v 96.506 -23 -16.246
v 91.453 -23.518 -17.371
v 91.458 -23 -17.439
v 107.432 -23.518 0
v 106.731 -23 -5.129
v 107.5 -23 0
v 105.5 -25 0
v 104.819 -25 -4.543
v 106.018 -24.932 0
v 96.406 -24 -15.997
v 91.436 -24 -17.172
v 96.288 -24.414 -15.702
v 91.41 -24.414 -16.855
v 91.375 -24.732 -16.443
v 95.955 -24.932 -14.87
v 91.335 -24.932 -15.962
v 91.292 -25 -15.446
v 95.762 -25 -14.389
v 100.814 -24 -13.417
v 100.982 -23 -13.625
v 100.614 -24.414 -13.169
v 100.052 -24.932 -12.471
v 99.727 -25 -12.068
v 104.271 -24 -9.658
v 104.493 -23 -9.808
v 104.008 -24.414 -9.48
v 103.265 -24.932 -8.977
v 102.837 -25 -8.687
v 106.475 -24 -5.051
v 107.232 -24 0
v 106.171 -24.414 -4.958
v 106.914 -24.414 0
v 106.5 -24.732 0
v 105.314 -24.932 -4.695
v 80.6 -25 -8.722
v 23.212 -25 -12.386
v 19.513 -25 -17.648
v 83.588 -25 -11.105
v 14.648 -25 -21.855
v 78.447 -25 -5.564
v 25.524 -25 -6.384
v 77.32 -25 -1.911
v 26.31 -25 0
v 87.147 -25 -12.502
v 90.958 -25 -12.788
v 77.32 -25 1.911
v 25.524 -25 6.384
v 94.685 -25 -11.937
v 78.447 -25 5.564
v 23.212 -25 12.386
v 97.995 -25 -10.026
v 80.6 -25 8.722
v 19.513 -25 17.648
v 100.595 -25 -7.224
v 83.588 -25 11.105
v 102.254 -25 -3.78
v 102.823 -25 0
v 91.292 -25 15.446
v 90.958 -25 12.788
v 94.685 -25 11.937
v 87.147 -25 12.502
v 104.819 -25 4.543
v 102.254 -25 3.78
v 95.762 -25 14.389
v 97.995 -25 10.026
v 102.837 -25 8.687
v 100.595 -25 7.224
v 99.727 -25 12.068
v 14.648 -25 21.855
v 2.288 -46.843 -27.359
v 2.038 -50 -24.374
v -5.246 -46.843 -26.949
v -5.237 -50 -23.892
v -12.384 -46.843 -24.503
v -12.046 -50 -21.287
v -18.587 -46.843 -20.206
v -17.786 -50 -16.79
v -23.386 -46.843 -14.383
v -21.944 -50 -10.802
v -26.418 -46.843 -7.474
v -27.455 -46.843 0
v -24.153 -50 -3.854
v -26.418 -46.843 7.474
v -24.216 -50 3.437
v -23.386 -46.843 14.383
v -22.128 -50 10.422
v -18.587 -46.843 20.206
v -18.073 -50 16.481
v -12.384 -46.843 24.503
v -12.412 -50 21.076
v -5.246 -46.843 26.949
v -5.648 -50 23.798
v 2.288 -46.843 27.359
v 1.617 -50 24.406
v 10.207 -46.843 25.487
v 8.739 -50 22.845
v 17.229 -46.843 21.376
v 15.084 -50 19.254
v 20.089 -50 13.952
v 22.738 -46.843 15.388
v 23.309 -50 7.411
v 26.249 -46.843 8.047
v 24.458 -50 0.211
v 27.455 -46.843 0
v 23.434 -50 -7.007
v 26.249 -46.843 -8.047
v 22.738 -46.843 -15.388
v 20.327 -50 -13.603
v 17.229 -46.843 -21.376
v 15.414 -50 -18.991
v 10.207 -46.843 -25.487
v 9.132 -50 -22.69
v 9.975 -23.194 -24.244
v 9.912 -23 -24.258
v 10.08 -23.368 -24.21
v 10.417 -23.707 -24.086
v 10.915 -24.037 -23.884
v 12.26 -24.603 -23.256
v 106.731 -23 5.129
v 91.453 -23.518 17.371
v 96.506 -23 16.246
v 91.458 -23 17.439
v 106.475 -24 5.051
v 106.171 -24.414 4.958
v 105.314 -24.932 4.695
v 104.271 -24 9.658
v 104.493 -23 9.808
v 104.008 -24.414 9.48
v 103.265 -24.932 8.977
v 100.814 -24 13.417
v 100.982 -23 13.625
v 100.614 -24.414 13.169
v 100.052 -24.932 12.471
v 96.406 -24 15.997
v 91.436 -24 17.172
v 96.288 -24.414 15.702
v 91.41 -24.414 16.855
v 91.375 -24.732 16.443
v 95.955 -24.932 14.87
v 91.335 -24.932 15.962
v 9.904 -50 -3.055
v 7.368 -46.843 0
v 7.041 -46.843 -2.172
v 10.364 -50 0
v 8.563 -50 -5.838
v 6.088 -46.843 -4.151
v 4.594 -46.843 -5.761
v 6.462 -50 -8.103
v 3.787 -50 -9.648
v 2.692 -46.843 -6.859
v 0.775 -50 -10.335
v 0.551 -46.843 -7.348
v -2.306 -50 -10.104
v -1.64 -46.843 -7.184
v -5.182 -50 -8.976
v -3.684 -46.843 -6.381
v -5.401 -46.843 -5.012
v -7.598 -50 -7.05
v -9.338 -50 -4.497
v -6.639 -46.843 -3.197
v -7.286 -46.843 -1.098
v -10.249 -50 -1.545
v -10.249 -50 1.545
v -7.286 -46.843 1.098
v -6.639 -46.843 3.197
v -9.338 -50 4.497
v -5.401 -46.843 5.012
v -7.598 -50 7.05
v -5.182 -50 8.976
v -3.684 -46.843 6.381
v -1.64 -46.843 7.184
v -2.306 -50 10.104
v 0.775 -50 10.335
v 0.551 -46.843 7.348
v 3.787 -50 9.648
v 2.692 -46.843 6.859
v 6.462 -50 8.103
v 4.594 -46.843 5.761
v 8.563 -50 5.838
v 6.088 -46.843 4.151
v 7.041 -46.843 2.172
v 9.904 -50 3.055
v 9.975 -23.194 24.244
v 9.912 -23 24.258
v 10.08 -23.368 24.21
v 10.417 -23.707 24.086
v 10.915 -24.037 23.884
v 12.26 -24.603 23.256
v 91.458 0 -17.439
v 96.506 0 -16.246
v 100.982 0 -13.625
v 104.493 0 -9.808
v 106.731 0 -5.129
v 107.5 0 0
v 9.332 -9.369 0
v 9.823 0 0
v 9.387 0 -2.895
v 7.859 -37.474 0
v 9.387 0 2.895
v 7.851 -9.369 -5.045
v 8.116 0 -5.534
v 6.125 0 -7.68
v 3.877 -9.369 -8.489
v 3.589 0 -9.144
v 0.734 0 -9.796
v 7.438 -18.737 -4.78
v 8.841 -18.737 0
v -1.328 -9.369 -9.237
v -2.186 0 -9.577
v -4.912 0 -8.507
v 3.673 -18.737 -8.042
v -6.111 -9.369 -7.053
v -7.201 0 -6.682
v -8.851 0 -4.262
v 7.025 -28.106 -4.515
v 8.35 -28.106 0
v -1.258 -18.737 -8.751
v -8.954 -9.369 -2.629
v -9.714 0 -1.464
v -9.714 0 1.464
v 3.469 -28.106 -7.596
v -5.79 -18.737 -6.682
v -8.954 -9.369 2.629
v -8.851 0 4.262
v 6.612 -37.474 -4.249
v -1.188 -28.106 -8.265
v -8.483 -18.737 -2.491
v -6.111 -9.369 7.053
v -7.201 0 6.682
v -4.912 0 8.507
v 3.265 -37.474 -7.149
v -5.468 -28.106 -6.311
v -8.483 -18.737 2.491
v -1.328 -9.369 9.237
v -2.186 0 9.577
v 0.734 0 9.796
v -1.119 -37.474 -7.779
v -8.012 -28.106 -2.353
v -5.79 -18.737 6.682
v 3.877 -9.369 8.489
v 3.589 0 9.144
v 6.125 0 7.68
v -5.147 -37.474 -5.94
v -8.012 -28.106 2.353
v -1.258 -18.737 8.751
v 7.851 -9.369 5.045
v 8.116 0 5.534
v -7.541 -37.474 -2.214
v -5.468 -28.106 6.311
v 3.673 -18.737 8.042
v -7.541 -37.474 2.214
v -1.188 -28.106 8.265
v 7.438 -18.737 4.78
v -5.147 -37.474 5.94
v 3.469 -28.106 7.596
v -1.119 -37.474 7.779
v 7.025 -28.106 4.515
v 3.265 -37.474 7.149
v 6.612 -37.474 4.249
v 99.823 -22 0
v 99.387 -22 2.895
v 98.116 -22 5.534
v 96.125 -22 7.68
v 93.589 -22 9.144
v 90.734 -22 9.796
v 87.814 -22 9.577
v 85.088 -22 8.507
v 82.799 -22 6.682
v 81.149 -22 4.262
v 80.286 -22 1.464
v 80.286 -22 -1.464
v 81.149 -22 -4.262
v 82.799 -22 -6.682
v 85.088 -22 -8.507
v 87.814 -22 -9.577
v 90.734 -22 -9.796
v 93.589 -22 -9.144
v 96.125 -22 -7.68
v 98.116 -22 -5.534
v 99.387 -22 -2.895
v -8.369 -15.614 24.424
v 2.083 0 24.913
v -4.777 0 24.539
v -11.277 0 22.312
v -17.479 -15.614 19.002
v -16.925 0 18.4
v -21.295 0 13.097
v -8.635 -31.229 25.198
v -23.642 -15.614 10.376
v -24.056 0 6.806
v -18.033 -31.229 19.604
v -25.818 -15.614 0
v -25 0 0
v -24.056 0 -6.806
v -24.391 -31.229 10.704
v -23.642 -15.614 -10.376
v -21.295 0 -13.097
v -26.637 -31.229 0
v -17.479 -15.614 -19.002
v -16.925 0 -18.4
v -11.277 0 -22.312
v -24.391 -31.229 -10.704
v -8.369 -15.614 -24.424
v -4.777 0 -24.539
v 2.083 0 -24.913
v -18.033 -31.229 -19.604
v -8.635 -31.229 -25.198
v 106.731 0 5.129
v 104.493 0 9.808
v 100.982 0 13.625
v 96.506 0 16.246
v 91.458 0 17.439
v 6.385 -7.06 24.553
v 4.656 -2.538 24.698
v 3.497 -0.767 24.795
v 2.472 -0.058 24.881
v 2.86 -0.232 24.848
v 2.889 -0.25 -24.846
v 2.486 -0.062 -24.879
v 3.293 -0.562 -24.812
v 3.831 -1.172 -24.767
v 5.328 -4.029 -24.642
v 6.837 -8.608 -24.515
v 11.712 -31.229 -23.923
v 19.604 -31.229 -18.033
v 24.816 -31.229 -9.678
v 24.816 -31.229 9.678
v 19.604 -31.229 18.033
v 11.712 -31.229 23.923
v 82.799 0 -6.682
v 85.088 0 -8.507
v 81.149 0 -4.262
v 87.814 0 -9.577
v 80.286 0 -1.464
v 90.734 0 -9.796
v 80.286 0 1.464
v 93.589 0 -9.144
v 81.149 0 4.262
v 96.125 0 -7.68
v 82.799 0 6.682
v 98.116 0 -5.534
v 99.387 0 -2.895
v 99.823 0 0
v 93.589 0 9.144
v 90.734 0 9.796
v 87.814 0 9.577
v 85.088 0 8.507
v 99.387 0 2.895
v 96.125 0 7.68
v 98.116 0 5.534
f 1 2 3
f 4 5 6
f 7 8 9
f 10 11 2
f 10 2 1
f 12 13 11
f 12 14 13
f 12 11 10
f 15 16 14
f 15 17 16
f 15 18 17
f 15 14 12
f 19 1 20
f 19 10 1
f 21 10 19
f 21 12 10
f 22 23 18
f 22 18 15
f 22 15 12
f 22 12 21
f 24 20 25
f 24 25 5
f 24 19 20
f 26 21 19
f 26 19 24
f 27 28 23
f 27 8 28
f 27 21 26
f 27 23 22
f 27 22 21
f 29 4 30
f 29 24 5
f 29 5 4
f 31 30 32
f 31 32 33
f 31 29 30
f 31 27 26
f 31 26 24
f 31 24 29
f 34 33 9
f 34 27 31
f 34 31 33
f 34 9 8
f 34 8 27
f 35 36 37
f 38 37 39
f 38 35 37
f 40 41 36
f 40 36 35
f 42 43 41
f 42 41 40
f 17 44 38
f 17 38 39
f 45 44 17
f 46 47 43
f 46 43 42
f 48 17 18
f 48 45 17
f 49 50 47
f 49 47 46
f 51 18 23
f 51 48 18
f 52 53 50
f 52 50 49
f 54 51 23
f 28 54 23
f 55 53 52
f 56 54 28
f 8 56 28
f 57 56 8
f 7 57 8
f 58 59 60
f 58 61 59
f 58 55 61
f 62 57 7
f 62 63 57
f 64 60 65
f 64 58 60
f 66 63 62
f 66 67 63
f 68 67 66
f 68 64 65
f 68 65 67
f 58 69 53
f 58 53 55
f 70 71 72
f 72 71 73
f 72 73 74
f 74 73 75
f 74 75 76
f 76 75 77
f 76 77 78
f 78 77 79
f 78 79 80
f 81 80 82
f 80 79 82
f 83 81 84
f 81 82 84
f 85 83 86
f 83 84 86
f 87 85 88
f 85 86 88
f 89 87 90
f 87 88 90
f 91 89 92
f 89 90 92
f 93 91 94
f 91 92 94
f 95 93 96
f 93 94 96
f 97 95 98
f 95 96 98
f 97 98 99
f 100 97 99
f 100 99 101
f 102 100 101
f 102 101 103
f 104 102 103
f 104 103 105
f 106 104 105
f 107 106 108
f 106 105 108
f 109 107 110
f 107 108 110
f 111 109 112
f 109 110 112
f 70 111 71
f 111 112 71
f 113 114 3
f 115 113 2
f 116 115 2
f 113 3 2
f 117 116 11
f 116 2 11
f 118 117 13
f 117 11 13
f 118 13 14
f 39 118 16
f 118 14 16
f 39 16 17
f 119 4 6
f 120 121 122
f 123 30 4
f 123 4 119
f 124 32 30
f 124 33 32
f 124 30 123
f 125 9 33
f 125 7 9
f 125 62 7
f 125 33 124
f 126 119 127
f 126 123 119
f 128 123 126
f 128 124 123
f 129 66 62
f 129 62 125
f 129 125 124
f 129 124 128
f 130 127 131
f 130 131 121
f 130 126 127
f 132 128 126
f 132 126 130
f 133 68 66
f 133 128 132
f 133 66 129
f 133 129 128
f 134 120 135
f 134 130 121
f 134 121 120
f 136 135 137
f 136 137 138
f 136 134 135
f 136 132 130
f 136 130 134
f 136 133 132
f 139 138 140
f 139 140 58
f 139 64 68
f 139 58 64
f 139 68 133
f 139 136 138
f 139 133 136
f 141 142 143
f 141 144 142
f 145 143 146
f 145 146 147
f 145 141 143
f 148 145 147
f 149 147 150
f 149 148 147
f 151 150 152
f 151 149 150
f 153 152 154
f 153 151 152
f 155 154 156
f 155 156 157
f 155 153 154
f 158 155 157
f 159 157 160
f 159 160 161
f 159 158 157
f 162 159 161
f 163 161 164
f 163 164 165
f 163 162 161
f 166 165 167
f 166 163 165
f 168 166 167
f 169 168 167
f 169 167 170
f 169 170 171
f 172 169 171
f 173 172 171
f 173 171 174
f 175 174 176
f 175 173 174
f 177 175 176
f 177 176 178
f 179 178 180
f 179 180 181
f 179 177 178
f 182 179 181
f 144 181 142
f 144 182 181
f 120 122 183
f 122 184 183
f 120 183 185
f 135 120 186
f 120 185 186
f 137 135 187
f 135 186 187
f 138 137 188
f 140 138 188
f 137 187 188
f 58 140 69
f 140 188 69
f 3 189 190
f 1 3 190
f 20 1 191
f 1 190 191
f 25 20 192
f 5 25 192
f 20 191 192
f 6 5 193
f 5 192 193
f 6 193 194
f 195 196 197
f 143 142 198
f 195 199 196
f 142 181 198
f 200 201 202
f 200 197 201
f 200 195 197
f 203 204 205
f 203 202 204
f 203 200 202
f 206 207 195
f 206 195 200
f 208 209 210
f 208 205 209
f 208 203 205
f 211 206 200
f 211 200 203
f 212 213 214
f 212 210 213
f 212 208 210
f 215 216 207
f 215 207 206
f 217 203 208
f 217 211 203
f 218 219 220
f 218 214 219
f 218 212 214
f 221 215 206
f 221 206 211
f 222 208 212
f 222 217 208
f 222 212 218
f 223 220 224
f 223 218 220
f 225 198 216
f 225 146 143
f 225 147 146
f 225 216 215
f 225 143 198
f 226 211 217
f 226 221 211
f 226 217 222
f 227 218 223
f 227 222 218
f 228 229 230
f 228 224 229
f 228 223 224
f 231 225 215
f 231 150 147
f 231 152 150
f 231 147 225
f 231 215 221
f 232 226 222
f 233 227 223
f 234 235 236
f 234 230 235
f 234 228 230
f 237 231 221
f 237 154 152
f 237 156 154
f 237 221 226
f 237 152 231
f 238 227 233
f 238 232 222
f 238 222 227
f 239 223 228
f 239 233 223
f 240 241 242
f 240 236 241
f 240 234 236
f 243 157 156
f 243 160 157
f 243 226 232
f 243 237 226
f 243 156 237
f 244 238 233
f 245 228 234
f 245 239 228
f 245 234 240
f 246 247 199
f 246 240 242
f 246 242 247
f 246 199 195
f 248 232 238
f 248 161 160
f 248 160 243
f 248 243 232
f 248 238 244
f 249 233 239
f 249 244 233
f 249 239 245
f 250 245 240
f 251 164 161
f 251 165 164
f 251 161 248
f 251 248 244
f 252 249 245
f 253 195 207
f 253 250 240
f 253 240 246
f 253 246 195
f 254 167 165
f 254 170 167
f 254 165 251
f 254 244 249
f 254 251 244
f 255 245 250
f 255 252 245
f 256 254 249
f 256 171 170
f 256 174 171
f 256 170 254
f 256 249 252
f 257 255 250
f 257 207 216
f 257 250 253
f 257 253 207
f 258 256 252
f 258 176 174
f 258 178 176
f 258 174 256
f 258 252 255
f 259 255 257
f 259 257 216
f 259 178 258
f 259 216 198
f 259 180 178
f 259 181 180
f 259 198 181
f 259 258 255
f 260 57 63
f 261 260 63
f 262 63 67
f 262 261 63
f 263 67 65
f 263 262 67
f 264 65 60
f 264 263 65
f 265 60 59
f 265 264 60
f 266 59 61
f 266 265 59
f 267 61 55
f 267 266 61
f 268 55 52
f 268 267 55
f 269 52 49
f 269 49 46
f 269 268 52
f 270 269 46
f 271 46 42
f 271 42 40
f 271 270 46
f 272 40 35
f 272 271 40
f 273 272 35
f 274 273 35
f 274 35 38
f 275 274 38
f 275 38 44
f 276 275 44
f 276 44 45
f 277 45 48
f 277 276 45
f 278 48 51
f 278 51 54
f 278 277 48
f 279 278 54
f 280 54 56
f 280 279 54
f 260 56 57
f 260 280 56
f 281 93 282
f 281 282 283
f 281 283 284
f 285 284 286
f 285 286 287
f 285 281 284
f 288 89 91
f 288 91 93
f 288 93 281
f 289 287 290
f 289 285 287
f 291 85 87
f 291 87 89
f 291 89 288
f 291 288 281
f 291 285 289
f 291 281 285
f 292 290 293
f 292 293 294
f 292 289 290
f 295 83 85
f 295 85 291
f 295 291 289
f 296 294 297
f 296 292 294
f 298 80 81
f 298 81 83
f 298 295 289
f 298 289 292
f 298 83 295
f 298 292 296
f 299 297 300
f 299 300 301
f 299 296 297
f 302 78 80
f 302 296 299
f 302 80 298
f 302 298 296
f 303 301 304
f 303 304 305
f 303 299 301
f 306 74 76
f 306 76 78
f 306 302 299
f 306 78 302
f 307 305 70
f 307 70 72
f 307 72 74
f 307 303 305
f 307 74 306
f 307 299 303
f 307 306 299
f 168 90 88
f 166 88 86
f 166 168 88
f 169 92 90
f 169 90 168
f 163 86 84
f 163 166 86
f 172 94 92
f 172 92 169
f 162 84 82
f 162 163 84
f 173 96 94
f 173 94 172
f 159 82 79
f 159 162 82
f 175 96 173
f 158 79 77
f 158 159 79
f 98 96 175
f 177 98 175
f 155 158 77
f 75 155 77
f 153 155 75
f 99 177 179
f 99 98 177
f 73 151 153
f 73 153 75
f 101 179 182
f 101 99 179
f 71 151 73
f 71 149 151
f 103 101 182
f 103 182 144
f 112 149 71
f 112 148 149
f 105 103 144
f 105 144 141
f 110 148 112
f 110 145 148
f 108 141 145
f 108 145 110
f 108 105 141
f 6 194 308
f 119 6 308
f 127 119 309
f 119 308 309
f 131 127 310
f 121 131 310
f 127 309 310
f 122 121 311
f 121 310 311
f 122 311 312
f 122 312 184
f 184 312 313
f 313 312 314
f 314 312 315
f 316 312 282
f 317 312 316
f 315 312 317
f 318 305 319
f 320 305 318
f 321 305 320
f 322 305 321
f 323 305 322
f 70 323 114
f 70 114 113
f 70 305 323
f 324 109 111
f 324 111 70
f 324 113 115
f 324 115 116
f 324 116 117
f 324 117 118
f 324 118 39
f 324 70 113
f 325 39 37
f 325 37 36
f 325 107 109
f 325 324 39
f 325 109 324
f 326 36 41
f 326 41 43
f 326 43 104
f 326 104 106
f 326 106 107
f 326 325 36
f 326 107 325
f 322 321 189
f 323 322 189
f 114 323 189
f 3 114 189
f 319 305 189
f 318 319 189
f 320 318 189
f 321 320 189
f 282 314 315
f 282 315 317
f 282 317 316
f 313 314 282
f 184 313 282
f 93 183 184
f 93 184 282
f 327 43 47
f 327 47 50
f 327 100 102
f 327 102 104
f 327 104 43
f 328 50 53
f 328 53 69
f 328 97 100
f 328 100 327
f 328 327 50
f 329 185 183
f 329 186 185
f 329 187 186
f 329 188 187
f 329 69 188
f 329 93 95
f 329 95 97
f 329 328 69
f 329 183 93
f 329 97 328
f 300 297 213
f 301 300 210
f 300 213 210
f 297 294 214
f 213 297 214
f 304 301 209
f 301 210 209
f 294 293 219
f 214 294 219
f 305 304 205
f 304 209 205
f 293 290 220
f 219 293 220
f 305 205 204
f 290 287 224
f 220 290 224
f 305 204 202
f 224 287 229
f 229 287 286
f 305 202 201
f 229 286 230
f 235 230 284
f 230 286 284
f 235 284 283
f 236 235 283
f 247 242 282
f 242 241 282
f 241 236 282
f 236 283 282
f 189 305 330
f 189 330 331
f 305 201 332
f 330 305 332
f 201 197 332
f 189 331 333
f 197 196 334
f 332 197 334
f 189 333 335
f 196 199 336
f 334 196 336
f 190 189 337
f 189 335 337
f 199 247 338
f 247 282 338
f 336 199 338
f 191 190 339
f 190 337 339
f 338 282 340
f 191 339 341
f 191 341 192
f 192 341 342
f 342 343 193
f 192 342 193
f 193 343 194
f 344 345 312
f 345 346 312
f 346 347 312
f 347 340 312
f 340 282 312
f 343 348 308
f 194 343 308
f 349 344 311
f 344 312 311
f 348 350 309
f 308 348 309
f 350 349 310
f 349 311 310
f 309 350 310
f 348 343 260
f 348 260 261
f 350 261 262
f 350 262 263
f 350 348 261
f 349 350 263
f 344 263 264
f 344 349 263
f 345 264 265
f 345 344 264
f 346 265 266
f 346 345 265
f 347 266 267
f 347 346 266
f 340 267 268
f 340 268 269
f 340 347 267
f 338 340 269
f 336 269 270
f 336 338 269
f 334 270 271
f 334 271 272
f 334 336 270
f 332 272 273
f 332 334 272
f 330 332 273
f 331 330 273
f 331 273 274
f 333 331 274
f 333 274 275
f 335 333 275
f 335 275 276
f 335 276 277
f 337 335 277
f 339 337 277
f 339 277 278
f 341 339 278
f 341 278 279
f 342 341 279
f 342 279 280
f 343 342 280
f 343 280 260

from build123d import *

# Parameters (mm, degrees)
F0_R     = 9.8233576781
F1_DEPTH = 25
F2_DEPTH = 50
F2_TAPER = -3
F4_R     = 2


# Not quite as in the source:
# - a fillet or chamfer that OpenCascade refuses, or shapes differently, is made with other operations: its cross-section is extruded or revolved along the edge and cut away or added


with BuildPart() as f1:
    # F0 (on Front) → F1 (new body)
    with BuildSketch(Plane.XZ):
        with BuildLine():
            ThreePointArc((2.0833333333, 24.9130432148), (18.3995018048, 16.9250800097), (25, 0))
            ThreePointArc((25, 0), (18.3995018048, -16.9250800097), (2.0833333333, -24.9130432148))
            Line((2.0833333333, -24.9130432148), (91.4583333333, -17.4391302504))
            ThreePointArc((91.4583333333, -17.4391302504), (72.5, 0), (91.4583333333, 17.4391302504))
            Line((91.4583333333, 17.4391302504), (2.0833333333, 24.9130432148))
        make_face()
        with BuildLine():
            ThreePointArc((2.0833333333, -24.9130432148), (18.3995018048, -16.9250800097), (25, 0))
            ThreePointArc((25, 0), (18.3995018048, 16.9250800097), (2.0833333333, 24.9130432148))
            ThreePointArc((2.0833333333, 24.9130432148), (-25, 0), (2.0833333333, -24.9130432148))
        make_face()
        Circle(F0_R, mode=Mode.SUBTRACT)
        with BuildLine():
            ThreePointArc((107.5, 0), (102.8796512634, 11.8475560068), (91.4583333333, 17.4391302504))
            ThreePointArc((91.4583333333, 17.4391302504), (72.5, 0), (91.4583333333, -17.4391302504))
            ThreePointArc((91.4583333333, -17.4391302504), (102.8796512634, -11.8475560068), (107.5, 0))
        make_face()
        with Locations((90, 0)):
            Circle(F0_R, mode=Mode.SUBTRACT)
    extrude(amount=F1_DEPTH)

    # F0 (on Front) → F2 (join)
    with BuildSketch(Plane.XZ):
        with BuildLine():
            ThreePointArc((2.0833333333, -24.9130432148), (18.3995018048, -16.9250800097), (25, 0))
            ThreePointArc((25, 0), (18.3995018048, 16.9250800097), (2.0833333333, 24.9130432148))
            ThreePointArc((2.0833333333, 24.9130432148), (-25, 0), (2.0833333333, -24.9130432148))
        make_face()
        Circle(F0_R, mode=Mode.SUBTRACT)
    extrude(amount=F2_DEPTH, taper=F2_TAPER)

    # F3: chamfer of 3 on 3 edges, made by hand

    # F3_s1 → F3_t2 (revolve, cut)
    with BuildSketch(Plane.XY):
        Polygon((102.8233576781, -25), (99.8233576781, -22), (99.8233576781, -25), align=None)
    revolve(axis=Axis((90, -25, 0), (0, -1, 0)), mode=Mode.SUBTRACT)

    # F3_s3 → F3_t4 (revolve, cut)
    with BuildSketch(Plane.XY):
        Polygon((7.3684204855, -46.8429921313), (10.3643090898, -50), (7.2029687139, -50), align=None)
    revolve(axis=Axis((0, -50, 0), (0, 1, 0)), mode=Mode.SUBTRACT)

    # F3_s5 → F3_t6 (revolve, cut)
    with BuildSketch(Plane(origin=(0, 0, 0), x_dir=(0, 1, 0), z_dir=(0.9965217286, 0, 0.0833333333))):
        Polygon((-46.8429921313, -27.4549371926), (-50, -24.4590485883), (-50, -27.6203889642), align=None)
    revolve(axis=Axis((0, -50, 0), (0, 1, 0)), mode=Mode.SUBTRACT)

    # F4
    f4_edges = [f1.edges().sort_by_distance(p)[0] for p in [
        (50.856157, -25, -20.834455),
        (107.5, -25, 0),
        (50.856157, -25, 20.834455),
    ]]
    fillet(f4_edges, radius=F4_R)


solid = f1.part
